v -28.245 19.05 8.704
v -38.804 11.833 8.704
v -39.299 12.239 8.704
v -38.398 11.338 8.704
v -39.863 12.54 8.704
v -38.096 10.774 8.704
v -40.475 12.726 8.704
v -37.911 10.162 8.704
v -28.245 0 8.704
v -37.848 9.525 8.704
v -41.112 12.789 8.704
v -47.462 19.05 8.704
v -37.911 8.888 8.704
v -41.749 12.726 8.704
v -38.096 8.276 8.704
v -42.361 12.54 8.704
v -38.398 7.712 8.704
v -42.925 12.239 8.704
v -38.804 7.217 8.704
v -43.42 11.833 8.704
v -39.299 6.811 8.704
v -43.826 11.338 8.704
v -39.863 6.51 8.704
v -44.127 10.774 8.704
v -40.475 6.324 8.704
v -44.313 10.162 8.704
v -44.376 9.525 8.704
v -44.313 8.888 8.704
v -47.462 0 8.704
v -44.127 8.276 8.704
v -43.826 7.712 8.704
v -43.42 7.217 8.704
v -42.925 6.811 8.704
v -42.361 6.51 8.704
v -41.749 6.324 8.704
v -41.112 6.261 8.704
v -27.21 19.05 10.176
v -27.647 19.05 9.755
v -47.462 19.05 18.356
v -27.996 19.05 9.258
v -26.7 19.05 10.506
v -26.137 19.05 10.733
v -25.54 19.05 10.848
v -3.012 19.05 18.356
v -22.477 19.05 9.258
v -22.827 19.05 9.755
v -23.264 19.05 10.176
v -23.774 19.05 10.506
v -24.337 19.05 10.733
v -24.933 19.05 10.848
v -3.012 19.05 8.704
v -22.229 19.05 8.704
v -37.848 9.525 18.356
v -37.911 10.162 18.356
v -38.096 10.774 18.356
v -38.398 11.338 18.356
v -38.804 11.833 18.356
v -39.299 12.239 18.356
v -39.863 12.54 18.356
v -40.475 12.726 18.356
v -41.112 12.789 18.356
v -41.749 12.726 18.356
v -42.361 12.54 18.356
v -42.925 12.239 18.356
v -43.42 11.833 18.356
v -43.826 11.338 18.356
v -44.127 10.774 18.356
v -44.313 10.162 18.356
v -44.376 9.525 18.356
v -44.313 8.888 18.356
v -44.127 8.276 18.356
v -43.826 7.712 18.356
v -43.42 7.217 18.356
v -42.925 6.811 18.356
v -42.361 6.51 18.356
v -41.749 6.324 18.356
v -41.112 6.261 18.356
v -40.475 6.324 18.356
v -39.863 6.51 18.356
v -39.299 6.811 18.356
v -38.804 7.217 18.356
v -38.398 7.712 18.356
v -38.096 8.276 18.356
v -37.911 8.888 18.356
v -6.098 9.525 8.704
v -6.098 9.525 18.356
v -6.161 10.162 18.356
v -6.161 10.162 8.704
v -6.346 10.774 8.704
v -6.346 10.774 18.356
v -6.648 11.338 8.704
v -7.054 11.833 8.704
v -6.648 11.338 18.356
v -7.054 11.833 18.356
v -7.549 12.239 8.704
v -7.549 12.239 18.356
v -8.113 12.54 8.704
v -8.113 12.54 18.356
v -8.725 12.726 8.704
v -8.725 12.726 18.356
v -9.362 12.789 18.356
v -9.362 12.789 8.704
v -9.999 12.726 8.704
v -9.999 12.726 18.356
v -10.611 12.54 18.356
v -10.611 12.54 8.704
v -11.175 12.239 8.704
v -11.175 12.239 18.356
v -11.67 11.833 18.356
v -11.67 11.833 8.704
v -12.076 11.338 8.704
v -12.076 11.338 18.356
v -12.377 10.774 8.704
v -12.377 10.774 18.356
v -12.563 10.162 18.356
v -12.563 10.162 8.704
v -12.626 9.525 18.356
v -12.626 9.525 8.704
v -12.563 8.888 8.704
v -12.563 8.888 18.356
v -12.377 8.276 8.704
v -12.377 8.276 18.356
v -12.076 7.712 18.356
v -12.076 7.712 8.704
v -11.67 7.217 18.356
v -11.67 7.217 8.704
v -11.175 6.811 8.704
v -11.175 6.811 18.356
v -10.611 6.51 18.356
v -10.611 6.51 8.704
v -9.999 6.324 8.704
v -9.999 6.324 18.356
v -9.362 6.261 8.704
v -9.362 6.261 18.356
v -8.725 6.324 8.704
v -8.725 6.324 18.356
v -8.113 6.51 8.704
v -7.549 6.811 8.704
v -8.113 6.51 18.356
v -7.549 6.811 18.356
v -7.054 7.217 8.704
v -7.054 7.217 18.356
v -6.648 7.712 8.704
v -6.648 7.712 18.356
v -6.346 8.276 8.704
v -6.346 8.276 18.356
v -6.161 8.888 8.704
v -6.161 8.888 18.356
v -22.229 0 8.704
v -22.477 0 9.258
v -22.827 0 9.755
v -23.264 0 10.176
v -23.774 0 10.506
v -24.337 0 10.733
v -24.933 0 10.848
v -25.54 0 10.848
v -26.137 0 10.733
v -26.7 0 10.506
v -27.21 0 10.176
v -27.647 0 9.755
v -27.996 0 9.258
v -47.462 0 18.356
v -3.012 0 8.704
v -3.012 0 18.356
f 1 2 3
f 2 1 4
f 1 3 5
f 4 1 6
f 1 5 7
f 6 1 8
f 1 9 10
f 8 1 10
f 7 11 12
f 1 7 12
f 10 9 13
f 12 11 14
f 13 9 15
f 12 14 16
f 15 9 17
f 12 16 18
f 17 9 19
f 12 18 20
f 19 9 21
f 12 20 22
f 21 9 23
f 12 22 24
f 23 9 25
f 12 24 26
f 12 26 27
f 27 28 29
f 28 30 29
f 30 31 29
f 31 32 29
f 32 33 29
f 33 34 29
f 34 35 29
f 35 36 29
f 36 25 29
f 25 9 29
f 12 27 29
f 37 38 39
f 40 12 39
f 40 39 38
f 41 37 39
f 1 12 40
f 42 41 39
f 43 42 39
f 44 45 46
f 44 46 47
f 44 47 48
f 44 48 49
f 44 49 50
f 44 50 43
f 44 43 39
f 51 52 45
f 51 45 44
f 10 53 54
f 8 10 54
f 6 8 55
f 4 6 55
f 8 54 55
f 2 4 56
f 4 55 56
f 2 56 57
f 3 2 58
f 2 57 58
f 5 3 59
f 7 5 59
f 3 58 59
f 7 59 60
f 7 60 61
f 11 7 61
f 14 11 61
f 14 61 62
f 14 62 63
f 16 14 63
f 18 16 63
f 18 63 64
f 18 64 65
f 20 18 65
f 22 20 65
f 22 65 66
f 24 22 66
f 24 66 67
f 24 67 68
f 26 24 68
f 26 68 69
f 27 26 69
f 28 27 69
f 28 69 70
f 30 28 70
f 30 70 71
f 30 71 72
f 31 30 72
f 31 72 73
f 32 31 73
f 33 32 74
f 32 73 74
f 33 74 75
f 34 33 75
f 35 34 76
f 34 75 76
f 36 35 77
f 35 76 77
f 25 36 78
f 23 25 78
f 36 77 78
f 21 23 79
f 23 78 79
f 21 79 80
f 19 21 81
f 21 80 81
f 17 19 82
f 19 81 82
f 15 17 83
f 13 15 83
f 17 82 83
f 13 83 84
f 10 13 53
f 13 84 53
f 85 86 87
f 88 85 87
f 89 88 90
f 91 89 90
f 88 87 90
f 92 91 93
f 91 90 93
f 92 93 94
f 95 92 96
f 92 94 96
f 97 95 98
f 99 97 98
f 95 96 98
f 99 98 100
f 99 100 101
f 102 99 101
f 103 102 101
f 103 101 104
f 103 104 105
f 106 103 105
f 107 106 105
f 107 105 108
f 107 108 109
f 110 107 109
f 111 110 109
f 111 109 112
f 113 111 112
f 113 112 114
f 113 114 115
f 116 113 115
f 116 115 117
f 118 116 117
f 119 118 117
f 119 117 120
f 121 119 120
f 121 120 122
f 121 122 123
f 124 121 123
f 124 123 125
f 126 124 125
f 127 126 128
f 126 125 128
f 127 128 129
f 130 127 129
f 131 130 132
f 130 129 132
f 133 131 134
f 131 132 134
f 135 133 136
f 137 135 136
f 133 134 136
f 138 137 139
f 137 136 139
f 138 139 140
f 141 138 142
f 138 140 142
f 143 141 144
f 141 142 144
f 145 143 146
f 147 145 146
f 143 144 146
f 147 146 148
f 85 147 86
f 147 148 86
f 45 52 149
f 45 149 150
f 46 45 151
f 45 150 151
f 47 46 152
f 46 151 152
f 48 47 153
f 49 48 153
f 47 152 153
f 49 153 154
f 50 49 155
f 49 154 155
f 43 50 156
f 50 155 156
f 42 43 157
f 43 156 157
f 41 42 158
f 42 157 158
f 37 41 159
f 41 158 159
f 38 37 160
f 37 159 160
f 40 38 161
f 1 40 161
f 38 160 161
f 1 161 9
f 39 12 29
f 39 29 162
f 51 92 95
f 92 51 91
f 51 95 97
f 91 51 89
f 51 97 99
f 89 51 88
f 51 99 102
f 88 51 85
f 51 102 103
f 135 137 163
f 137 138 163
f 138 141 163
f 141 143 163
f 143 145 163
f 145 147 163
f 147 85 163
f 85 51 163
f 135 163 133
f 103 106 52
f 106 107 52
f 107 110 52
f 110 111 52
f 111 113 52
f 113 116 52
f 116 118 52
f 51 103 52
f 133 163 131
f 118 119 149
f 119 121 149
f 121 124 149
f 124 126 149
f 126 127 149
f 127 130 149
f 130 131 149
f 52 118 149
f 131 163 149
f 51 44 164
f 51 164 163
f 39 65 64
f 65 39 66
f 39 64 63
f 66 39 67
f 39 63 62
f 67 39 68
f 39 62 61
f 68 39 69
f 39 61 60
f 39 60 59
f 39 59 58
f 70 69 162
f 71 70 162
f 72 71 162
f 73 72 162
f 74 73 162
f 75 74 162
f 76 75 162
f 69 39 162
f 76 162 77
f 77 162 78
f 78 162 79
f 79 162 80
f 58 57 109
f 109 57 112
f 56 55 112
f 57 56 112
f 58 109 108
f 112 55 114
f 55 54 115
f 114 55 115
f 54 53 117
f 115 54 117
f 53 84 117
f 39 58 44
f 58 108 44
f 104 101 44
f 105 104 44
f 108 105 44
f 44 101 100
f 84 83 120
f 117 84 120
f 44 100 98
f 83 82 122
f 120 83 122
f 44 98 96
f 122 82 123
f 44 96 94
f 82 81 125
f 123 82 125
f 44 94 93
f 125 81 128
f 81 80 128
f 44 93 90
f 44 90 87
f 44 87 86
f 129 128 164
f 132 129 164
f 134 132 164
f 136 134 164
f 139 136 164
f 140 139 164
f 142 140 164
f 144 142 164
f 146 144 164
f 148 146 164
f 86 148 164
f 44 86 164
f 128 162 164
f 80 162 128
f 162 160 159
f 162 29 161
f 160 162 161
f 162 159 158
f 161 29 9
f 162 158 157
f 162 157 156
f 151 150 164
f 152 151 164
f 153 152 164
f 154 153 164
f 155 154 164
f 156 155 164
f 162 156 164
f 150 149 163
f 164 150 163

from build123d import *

# Parameters (mm, degrees)
BOSS_EXTRUDE1_DEPTH = 19.05
SKETCH2_R           = 3.2639
CUT_EXTRUDE2_DEPTH  = 11.684


with BuildPart() as part:
    # Sketch1 → Boss-Extrude1 (new body)
    with BuildSketch(Plane(origin=(0, 0, 0), x_dir=(1, 0, 0), z_dir=(0, 1, 0))):
        with BuildLine():
            Line((-28.244883355, -8.703959301), (-47.461832657, -8.703959301))
            Line((-47.461832657, -8.703959301), (-47.461832657, -18.355959301))
            Line((-47.461832657, -18.355959301), (-3.011832657, -18.355959301))
            Line((-3.011832657, -18.355959301), (-3.011832657, -8.703959301))
            Line((-3.011832657, -8.703959301), (-22.228781959, -8.703959301))
            ThreePointArc((-22.228781959, -8.703959301), (-25.236832657, -10.862959301), (-28.244883355, -8.703959301))
        make_face()
    extrude(amount=BOSS_EXTRUDE1_DEPTH)

    # Sketch2 → Cut-Extrude2 (cut)
    with BuildSketch(Plane.XY.offset(18.355959301)):
        with Locations((-41.111832657, 9.525)):
            Circle(SKETCH2_R)
        with Locations((-9.361832657, 9.525)):
            Circle(SKETCH2_R)
    extrude(amount=-CUT_EXTRUDE2_DEPTH, mode=Mode.SUBTRACT)


solid = part.part
